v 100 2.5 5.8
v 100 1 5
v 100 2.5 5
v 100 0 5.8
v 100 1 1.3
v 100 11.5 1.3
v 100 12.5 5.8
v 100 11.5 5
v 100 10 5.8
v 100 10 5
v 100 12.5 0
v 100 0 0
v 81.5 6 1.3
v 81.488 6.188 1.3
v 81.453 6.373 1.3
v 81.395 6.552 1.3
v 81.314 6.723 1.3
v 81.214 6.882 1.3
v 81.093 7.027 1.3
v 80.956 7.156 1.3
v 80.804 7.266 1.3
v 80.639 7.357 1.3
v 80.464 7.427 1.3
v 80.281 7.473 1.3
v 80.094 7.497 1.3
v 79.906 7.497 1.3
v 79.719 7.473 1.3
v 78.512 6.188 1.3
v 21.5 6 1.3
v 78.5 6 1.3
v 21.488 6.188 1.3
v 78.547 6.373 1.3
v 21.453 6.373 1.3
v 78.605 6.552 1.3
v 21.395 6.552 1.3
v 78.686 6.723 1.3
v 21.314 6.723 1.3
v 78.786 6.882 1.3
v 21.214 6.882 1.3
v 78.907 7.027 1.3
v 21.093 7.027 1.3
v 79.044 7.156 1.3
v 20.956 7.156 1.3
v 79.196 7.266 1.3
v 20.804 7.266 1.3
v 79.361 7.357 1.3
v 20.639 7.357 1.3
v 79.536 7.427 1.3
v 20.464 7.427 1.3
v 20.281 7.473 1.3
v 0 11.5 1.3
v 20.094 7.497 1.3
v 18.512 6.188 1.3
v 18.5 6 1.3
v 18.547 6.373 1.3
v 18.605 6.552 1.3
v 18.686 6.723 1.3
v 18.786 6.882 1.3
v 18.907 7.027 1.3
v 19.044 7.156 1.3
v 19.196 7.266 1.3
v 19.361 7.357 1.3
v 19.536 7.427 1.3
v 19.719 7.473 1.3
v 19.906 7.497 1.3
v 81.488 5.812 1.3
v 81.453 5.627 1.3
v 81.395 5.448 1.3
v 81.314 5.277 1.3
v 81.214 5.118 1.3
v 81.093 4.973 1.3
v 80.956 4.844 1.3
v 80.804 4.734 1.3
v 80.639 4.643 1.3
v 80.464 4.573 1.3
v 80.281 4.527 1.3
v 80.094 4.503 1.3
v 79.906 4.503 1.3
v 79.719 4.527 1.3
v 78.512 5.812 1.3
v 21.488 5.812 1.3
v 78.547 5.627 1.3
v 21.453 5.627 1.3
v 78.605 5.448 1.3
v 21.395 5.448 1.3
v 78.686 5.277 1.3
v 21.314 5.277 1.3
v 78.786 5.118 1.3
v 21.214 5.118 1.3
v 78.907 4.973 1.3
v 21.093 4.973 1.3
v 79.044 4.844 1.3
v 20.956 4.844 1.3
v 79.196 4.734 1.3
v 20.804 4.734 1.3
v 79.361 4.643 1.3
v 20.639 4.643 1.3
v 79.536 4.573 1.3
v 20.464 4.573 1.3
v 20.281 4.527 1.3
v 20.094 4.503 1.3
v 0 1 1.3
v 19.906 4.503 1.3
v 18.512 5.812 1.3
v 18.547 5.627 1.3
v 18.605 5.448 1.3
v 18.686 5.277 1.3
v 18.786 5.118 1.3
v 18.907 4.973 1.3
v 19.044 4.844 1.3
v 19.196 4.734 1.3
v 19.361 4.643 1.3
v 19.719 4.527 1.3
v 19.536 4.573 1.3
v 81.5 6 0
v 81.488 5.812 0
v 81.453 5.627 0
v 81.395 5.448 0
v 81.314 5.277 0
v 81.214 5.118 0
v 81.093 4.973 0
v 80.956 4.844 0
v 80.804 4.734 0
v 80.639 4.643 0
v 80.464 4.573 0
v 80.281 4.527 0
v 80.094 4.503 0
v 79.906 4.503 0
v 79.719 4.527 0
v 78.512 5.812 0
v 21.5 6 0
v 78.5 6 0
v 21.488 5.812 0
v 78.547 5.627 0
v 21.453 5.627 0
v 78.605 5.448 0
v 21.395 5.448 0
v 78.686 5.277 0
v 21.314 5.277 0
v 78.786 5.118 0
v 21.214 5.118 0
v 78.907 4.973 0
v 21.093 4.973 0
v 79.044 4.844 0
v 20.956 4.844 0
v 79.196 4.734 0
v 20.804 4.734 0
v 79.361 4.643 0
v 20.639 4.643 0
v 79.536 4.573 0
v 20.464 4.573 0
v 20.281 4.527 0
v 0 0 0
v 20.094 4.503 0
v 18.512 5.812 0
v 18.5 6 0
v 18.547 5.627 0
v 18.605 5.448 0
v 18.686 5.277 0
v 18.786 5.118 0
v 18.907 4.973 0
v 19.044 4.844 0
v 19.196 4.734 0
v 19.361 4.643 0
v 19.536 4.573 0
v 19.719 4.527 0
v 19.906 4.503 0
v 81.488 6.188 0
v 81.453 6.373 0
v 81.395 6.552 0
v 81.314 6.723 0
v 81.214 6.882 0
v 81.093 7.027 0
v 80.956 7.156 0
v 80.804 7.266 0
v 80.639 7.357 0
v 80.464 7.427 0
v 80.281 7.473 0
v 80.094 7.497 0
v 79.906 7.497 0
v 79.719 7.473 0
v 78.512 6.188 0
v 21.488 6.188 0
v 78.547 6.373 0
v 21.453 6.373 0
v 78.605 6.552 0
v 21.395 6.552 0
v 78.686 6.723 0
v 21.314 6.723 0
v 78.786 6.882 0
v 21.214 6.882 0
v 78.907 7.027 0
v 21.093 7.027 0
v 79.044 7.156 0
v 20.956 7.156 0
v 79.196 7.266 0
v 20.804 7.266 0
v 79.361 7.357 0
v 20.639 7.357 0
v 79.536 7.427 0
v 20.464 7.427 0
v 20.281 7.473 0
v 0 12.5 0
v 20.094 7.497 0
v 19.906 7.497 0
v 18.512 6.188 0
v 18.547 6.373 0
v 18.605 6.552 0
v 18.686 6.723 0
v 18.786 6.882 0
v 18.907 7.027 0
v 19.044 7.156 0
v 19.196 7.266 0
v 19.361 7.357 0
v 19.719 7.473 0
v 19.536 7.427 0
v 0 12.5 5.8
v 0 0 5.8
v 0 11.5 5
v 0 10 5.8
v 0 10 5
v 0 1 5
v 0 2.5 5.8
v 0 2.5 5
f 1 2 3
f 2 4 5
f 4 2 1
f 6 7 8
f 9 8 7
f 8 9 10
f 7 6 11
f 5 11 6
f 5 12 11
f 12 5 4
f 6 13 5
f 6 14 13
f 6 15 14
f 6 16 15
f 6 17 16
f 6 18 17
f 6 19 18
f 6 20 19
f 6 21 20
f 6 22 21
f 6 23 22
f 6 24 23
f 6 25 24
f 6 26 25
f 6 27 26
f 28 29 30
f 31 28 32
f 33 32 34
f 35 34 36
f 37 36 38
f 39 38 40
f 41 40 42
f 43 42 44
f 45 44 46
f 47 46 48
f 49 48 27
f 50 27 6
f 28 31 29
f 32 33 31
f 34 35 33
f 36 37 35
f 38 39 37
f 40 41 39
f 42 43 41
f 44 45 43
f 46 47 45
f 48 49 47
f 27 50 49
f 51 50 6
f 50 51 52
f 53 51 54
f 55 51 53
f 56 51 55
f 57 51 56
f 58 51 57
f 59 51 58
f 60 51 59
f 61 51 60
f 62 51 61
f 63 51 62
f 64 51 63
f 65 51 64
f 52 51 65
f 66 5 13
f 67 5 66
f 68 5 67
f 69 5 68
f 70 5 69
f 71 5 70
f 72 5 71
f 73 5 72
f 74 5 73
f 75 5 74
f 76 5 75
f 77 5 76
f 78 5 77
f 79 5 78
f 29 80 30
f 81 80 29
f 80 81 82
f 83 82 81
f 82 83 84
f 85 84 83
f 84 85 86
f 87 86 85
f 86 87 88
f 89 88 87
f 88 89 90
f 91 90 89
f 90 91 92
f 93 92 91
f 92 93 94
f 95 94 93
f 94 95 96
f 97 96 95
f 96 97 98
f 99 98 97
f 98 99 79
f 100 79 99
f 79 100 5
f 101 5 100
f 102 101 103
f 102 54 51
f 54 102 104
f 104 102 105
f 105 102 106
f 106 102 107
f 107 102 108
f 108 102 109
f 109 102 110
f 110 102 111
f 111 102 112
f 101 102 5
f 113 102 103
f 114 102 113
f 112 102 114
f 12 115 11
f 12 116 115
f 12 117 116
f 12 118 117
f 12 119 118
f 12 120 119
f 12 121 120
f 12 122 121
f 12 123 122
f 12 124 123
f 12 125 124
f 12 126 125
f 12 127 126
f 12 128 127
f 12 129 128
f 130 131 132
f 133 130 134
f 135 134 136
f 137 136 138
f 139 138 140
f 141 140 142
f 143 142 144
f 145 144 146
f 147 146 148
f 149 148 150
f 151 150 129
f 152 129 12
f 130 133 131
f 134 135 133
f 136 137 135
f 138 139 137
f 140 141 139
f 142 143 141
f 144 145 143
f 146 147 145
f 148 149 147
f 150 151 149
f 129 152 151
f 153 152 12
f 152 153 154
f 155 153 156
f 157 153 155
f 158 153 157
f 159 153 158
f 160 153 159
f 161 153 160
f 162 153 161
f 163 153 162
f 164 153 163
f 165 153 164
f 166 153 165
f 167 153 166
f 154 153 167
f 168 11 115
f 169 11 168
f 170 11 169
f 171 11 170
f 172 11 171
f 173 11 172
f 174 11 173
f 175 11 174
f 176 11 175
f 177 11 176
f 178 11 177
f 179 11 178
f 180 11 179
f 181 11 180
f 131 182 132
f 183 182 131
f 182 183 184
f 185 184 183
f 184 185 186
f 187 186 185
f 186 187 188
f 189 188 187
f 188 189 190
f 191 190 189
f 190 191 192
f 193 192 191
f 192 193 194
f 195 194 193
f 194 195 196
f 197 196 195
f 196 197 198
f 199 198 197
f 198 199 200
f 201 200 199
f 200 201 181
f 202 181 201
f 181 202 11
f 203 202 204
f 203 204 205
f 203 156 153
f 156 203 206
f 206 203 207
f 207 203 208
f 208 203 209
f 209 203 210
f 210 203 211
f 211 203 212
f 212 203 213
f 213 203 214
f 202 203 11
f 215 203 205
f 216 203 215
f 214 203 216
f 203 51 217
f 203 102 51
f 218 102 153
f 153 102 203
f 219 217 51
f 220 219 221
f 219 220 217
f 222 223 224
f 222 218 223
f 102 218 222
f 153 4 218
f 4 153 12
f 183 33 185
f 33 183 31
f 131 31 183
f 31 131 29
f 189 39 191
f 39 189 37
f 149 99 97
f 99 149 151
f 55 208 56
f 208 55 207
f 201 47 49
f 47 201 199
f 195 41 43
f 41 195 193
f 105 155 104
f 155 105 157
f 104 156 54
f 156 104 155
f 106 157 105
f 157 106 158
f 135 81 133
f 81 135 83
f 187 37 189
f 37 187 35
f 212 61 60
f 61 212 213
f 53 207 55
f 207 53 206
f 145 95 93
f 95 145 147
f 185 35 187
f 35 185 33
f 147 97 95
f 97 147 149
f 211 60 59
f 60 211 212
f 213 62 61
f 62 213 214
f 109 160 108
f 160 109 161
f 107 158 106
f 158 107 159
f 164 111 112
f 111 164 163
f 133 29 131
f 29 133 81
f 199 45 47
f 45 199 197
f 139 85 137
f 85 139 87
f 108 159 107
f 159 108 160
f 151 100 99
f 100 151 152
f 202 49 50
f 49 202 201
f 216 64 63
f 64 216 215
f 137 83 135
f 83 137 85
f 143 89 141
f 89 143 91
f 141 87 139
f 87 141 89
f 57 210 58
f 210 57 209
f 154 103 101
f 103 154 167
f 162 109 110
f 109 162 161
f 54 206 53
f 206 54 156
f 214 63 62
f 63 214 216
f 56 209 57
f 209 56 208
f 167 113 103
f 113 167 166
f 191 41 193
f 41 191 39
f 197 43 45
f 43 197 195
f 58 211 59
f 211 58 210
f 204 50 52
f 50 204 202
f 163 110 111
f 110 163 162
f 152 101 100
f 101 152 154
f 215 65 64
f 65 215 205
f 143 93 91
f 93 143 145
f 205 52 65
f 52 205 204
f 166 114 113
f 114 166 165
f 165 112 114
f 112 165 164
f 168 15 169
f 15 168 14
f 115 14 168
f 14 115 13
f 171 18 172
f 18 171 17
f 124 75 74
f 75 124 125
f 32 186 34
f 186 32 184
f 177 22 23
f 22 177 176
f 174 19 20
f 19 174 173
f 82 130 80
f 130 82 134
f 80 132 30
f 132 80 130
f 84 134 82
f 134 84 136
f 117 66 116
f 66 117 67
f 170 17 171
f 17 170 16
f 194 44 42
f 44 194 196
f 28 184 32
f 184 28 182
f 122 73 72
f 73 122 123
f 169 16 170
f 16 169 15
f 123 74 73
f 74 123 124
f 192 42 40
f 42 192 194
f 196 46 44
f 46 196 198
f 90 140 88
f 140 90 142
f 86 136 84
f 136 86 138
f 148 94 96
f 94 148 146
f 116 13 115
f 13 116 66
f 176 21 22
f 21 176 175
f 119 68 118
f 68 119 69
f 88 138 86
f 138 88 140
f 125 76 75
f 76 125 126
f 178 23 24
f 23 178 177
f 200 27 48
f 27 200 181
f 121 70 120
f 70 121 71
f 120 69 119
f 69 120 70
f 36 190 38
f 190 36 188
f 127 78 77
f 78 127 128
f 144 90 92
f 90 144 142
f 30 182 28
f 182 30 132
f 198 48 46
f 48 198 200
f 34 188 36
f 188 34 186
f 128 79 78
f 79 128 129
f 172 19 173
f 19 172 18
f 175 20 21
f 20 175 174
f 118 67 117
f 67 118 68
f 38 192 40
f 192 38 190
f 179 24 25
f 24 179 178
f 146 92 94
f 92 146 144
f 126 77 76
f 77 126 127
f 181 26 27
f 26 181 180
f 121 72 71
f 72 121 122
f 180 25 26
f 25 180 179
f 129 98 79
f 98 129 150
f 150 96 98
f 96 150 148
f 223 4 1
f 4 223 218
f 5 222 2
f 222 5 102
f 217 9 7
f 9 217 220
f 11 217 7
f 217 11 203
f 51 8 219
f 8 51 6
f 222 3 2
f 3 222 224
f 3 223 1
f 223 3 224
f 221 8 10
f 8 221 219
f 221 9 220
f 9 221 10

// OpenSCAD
difference() 
{
cube([100,12,1.3]);
    translate([20,6,0])
    cylinder(r=3/2, h=2.3,$fn=50);
    translate([80,6,0])
    cylinder(r=3/2, h=2.3,$fn=50);
}
cube([100,1,5.8]);
translate([0,11.5,0])
cube([100,1,5.8]);
translate([0,0.5,5])
cube([100,2,0.8]);
translate([0,10,5])
cube([100,1.5,0.8]);
